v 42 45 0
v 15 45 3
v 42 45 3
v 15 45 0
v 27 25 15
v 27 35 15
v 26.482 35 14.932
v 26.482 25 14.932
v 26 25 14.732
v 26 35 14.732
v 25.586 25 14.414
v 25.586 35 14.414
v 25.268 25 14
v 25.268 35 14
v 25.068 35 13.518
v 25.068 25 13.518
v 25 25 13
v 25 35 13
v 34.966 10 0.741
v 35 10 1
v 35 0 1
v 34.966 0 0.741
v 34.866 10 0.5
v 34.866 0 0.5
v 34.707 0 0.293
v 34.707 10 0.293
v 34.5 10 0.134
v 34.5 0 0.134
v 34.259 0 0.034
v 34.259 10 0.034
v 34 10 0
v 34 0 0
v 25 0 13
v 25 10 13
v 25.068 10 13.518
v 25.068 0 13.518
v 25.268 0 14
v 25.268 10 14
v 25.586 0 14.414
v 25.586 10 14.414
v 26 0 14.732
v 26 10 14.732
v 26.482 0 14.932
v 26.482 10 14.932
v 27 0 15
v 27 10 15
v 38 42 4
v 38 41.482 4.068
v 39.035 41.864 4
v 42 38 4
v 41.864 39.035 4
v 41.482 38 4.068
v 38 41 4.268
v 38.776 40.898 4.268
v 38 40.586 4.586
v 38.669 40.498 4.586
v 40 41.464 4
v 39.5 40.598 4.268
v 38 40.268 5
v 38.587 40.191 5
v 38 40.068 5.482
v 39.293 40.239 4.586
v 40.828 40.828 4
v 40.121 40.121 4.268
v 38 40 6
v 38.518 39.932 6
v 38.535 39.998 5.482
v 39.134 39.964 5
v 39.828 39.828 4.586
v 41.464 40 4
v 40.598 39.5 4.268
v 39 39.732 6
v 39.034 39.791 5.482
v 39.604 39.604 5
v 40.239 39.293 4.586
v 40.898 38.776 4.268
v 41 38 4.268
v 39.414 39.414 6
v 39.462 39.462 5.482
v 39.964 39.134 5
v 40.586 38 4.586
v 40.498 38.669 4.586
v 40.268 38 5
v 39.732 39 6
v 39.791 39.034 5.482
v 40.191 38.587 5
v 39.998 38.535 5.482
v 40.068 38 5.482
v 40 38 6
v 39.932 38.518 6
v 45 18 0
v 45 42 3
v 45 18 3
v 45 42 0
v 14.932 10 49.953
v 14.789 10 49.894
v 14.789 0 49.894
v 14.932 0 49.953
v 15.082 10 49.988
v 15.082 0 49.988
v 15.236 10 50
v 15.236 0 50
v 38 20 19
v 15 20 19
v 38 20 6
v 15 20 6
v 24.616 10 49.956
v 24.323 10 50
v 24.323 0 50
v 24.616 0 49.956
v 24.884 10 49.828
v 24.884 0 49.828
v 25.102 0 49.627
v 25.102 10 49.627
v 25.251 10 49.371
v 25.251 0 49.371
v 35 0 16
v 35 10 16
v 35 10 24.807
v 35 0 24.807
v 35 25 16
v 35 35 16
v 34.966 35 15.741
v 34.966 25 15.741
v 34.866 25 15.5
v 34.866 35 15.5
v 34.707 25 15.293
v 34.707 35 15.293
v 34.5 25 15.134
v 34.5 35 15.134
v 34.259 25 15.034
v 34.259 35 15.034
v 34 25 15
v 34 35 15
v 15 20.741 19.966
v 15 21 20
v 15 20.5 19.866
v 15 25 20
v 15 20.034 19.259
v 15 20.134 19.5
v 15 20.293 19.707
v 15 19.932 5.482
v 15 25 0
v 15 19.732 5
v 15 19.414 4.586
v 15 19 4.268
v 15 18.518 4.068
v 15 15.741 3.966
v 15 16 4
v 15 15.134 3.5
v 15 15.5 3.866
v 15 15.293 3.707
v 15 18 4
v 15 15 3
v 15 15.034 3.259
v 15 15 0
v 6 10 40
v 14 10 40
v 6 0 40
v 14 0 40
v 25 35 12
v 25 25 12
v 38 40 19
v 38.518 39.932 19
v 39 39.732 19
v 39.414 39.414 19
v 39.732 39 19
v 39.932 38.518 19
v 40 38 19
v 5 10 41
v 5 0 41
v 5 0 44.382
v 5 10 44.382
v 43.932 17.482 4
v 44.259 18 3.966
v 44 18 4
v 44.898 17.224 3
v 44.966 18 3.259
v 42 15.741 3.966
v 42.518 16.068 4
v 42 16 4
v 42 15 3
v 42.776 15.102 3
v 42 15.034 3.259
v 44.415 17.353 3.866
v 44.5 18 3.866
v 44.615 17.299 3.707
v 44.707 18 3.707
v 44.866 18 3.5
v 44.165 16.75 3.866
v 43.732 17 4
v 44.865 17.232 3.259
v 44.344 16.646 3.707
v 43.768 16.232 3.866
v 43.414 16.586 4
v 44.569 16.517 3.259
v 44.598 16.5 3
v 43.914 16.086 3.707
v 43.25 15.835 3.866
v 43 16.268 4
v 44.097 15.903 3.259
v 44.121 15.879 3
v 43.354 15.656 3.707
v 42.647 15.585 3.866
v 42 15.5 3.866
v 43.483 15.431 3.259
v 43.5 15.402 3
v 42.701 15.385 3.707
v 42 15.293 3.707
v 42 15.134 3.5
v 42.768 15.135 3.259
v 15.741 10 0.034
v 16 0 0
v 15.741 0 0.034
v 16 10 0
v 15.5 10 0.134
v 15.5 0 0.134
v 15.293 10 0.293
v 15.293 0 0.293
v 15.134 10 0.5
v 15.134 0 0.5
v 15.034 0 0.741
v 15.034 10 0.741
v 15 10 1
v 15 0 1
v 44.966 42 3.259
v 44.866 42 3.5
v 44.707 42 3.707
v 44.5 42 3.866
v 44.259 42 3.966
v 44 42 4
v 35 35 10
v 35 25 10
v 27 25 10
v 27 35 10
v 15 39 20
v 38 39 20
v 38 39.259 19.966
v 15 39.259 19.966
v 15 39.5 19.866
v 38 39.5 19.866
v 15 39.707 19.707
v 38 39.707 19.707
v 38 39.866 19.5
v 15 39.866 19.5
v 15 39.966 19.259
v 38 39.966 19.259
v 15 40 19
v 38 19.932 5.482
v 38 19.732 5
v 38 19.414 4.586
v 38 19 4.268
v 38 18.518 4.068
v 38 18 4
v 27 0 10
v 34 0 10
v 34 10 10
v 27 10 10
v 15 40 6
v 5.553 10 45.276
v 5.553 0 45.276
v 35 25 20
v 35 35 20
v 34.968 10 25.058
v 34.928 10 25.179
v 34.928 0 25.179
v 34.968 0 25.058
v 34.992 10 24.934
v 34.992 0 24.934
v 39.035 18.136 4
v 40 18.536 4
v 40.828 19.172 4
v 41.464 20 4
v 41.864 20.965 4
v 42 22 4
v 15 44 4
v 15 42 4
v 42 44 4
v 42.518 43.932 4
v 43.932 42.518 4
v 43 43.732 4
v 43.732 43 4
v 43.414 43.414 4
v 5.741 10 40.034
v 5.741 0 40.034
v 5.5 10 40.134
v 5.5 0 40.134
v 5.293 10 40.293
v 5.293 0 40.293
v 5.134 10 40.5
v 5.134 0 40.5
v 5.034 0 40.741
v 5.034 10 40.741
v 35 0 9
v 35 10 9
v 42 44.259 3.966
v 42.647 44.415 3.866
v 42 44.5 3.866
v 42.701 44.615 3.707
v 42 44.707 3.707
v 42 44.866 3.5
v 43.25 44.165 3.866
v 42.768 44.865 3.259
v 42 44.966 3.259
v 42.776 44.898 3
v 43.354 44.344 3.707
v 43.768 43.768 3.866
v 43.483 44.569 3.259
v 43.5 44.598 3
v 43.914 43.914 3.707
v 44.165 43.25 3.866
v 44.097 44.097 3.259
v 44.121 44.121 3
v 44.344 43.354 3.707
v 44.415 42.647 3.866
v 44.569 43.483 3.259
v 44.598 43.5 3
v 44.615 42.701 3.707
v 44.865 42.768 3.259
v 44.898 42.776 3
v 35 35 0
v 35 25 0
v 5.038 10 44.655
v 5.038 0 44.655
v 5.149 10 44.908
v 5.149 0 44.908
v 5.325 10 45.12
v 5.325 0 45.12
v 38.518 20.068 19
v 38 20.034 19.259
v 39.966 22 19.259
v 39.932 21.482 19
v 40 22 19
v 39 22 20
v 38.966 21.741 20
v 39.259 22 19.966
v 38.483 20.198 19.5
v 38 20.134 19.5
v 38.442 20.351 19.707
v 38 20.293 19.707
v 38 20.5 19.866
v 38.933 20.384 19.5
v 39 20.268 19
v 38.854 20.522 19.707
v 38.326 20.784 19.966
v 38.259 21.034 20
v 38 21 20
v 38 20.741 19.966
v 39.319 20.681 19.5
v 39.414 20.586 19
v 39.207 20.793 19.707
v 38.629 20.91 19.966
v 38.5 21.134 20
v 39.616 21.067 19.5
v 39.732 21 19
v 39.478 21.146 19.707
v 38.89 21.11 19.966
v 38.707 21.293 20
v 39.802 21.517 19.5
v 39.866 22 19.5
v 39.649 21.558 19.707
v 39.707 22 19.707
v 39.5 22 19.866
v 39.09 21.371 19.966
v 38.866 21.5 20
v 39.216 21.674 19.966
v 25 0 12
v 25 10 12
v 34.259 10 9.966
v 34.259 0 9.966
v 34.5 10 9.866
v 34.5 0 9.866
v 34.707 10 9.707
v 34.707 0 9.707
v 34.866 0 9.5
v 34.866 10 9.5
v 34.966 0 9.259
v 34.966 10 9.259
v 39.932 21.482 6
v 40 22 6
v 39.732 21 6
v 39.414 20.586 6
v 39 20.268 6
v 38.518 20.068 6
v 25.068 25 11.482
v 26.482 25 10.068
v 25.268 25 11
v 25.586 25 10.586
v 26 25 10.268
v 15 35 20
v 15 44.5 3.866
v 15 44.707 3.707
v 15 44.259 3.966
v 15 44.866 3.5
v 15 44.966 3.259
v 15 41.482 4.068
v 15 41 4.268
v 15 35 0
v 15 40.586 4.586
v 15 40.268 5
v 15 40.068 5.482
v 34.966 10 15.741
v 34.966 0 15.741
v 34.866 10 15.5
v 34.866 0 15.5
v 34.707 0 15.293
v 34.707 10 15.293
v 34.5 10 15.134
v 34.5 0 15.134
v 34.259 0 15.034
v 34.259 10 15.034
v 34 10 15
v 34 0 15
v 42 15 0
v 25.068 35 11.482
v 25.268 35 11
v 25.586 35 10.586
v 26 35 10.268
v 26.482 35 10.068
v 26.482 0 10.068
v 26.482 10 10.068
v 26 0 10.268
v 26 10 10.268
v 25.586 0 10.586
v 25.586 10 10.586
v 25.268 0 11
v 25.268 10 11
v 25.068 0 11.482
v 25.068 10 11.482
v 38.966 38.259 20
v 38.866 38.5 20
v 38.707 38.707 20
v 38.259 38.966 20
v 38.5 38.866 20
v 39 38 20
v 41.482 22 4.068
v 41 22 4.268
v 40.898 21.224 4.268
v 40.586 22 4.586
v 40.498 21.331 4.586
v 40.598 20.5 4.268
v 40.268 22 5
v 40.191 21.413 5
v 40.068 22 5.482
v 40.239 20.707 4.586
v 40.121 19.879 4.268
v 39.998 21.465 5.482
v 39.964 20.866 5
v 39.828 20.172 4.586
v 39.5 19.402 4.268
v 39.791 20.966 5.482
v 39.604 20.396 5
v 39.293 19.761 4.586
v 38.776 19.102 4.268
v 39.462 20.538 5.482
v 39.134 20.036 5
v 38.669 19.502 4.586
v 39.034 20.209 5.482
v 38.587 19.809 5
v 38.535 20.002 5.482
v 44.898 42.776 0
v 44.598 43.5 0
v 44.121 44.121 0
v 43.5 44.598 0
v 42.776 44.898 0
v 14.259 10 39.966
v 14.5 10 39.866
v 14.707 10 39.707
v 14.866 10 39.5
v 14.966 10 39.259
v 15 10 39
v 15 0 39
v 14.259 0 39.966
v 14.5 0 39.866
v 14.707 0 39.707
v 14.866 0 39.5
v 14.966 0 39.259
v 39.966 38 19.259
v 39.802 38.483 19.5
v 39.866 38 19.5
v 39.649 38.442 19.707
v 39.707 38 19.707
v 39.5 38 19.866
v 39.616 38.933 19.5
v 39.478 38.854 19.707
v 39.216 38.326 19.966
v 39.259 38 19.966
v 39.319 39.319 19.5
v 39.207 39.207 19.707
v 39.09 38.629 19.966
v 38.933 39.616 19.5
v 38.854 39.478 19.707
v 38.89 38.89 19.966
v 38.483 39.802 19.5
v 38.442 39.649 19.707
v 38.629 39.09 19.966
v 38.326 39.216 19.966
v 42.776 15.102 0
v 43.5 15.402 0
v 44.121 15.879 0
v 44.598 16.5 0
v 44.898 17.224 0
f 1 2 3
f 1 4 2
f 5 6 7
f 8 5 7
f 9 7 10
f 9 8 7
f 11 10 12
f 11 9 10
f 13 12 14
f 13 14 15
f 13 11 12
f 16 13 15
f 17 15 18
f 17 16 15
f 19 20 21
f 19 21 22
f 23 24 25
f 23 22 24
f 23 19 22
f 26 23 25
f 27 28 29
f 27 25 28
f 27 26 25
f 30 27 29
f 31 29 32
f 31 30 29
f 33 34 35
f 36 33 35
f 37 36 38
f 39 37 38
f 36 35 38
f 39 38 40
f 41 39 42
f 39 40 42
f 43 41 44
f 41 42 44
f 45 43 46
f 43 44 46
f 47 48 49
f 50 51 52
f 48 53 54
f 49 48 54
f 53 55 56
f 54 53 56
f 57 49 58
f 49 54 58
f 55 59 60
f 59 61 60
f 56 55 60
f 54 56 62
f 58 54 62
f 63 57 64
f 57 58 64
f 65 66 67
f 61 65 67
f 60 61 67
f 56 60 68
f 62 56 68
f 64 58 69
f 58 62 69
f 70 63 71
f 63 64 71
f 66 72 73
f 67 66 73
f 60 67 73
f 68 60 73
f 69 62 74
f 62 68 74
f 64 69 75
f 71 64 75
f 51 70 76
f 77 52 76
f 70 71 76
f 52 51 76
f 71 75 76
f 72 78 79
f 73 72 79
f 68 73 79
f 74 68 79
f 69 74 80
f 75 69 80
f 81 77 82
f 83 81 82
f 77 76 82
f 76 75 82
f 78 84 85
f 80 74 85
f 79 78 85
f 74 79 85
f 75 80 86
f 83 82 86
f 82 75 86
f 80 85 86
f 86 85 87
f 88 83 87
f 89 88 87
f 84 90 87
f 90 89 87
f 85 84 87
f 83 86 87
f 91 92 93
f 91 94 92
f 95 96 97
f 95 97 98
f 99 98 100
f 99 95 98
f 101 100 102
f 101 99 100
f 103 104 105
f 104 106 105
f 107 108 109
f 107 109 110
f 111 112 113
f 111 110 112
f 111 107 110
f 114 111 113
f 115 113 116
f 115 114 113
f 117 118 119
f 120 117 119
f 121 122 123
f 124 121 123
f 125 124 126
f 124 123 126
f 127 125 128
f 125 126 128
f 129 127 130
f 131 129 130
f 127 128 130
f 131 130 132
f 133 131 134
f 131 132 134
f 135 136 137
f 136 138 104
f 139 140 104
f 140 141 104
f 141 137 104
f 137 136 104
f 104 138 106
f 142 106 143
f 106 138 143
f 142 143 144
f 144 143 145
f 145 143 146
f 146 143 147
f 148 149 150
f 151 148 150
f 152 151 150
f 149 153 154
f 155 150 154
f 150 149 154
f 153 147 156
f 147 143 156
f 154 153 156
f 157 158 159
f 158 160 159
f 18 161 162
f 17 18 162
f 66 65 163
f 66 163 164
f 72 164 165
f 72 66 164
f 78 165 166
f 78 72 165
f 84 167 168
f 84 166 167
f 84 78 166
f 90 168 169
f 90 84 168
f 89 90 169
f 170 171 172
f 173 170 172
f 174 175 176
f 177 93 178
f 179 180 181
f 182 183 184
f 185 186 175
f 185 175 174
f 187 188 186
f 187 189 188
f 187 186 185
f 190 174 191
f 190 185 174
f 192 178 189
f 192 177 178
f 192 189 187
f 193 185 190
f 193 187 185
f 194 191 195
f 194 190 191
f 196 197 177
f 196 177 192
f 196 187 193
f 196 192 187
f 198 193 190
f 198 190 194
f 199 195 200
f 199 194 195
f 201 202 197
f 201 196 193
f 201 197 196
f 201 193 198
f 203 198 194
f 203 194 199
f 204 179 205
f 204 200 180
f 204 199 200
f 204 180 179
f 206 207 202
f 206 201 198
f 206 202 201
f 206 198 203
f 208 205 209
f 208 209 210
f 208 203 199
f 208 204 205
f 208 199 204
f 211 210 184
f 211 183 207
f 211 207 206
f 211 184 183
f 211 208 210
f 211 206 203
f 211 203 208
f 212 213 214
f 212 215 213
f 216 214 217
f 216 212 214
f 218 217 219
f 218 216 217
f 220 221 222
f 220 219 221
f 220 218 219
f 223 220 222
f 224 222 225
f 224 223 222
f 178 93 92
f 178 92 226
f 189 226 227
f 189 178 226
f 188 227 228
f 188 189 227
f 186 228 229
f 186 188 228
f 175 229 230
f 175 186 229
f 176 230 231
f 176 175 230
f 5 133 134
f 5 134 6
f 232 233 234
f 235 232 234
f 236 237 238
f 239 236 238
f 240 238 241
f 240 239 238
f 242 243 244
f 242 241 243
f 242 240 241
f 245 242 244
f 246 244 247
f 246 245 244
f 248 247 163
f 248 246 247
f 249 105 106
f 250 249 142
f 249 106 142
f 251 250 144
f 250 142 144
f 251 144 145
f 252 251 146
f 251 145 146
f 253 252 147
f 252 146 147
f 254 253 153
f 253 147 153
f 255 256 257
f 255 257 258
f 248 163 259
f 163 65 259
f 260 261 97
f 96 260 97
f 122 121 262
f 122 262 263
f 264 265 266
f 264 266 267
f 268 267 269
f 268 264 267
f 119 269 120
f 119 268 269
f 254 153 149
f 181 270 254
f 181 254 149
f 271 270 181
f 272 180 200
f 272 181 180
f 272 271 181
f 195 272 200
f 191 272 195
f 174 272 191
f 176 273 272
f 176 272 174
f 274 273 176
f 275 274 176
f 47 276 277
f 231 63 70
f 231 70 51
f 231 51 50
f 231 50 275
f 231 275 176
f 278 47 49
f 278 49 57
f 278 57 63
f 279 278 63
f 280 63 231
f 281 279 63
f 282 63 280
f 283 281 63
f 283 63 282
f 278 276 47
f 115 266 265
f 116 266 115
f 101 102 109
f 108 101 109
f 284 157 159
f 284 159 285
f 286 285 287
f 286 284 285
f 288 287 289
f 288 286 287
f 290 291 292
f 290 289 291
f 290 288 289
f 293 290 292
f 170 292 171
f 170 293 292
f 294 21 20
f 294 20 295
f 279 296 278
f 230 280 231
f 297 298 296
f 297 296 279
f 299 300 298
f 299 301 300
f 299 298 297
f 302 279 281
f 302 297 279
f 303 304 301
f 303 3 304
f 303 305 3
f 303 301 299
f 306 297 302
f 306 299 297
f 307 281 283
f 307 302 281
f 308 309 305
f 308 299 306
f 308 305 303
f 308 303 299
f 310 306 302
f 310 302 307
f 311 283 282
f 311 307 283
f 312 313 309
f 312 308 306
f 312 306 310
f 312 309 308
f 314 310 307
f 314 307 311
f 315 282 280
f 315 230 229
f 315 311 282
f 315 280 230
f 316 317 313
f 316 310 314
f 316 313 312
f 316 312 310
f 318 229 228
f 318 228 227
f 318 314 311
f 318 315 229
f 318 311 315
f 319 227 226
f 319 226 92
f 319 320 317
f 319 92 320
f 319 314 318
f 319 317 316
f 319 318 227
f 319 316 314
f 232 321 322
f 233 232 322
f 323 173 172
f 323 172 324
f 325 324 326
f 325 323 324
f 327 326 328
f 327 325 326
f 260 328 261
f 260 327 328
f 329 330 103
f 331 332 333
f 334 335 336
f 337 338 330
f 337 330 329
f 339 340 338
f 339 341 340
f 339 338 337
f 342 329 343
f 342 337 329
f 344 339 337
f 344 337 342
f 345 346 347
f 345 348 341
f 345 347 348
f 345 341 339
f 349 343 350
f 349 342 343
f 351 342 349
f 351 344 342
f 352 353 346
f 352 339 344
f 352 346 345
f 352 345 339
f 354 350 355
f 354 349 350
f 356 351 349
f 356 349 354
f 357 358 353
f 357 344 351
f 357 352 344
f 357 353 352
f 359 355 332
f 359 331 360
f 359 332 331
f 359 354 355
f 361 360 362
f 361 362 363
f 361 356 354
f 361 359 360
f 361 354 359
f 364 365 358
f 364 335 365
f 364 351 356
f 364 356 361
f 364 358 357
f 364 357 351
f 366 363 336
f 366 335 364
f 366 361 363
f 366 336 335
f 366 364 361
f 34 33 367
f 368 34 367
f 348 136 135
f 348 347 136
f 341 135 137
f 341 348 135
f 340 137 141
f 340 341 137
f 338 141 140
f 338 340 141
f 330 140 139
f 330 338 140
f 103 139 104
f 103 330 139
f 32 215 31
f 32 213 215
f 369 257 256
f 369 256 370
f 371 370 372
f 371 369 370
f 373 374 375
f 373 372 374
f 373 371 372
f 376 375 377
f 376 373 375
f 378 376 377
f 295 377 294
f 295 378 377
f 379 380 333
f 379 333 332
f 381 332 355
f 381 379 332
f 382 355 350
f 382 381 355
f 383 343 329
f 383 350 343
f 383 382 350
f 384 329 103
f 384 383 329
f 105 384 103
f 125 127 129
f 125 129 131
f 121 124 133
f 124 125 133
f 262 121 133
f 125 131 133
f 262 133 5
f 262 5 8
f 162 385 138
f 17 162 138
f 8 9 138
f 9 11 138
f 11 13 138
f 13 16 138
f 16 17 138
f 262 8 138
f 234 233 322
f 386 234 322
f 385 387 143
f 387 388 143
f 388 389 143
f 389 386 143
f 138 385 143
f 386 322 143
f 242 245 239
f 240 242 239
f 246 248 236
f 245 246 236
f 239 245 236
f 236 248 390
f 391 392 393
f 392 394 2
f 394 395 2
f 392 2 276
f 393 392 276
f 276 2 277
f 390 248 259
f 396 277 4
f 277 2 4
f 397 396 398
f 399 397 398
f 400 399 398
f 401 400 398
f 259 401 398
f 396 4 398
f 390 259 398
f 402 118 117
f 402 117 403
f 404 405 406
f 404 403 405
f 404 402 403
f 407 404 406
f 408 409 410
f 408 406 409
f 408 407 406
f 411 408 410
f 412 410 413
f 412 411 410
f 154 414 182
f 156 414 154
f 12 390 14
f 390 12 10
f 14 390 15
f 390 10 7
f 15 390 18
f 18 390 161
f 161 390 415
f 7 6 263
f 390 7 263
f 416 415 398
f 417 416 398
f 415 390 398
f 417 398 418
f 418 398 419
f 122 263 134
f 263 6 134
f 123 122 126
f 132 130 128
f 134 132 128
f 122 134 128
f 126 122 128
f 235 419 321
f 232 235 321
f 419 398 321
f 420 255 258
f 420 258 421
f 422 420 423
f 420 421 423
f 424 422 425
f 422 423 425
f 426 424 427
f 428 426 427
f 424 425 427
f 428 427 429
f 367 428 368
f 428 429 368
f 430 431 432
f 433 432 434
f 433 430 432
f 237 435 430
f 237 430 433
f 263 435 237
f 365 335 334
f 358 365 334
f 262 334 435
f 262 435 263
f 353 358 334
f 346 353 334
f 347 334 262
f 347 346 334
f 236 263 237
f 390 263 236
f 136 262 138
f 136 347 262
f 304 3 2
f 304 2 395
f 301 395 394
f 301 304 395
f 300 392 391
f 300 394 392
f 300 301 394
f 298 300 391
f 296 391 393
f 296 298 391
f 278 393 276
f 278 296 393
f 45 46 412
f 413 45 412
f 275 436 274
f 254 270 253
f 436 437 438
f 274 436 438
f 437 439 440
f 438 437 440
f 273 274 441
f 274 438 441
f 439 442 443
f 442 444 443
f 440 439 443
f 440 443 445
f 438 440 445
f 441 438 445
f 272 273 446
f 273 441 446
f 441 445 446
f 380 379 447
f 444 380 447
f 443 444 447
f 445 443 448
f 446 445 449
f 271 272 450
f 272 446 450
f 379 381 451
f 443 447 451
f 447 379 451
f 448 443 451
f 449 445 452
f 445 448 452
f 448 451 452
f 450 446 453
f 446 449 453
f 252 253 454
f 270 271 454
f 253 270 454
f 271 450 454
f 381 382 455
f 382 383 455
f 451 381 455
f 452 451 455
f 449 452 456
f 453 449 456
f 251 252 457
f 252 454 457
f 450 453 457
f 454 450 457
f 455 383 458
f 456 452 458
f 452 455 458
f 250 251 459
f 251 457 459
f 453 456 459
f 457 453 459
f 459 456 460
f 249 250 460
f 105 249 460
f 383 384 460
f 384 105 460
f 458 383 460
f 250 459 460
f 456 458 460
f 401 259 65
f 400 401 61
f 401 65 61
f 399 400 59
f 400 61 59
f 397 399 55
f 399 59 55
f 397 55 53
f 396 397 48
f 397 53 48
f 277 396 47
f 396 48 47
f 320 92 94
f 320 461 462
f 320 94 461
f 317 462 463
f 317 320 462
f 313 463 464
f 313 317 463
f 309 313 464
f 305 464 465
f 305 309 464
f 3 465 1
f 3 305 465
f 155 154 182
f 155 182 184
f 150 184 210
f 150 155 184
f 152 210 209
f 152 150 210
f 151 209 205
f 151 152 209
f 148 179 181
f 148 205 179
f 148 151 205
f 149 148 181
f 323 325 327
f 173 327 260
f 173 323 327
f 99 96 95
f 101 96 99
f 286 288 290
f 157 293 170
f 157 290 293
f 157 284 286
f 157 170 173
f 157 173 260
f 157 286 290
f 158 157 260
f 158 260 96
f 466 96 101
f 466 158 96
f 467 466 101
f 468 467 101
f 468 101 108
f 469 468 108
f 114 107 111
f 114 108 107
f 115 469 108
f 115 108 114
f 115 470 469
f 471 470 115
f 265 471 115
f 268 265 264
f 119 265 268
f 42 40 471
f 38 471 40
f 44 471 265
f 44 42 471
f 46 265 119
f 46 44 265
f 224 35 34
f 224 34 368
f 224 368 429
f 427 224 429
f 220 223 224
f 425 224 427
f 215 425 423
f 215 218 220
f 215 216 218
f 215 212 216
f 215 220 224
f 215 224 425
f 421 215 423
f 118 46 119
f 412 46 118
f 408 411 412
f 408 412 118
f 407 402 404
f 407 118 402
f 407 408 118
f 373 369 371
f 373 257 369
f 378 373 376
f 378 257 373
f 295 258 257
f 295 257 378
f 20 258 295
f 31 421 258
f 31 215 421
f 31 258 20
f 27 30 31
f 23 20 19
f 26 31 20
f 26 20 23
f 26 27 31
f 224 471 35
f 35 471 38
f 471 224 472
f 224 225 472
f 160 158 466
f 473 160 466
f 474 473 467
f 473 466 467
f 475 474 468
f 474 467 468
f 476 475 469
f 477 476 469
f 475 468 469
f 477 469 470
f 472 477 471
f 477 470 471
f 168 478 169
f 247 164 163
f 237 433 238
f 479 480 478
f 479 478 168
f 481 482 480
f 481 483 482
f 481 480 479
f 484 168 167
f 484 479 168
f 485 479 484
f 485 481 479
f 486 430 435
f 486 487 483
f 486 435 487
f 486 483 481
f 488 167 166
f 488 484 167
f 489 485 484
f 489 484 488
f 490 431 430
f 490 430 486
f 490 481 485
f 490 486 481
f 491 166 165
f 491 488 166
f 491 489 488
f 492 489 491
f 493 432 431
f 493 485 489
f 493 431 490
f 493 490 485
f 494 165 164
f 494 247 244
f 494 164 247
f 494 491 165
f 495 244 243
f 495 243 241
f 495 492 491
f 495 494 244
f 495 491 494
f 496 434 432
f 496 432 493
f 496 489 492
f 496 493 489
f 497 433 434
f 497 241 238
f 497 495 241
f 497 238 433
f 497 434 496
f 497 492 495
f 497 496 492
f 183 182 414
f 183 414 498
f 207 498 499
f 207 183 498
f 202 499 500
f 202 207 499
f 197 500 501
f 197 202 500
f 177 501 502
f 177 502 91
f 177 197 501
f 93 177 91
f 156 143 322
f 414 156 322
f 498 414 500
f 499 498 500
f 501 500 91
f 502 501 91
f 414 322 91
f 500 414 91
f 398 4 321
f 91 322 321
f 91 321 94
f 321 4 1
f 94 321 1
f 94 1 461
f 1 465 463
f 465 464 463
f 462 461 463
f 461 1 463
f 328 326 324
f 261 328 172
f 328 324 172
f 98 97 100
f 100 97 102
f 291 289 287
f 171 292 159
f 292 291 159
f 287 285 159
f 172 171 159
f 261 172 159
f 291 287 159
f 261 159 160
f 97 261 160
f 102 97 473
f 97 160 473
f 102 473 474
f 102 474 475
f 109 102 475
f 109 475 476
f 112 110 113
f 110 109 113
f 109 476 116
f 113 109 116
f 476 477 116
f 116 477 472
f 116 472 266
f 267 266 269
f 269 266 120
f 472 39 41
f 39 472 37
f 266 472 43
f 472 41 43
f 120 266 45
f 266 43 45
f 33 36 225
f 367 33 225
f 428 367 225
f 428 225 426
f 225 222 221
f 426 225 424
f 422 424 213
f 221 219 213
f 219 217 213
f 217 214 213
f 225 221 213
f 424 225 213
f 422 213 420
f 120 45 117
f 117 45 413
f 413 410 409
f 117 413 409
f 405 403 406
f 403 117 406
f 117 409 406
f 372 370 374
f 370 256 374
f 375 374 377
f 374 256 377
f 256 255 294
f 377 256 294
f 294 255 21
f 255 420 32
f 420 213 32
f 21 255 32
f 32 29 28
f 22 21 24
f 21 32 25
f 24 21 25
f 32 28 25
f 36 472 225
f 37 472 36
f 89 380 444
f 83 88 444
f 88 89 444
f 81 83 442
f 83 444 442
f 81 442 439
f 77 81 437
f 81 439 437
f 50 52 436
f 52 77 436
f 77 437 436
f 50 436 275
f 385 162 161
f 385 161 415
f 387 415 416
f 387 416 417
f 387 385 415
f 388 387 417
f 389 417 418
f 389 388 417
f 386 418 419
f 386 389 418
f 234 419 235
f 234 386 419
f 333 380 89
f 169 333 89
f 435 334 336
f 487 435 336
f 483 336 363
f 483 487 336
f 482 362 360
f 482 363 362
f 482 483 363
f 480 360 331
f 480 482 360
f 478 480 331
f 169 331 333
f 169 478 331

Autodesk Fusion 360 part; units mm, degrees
sketch "Sketch1" plane through (0, 0, 0) normal (0, 1, 0) x (1, 0, 0)
  line L0 (25, 0) -> (15, 0)
  line L1 (15, 0) -> (15, -40)
  line L2 (25, -15) -> (25, -10)
  line L3 (15, -40) -> (5, -40)
  line L4 (5, -40) -> (5, -45)
  line L5 (15, -50) -> (25, -50)
  line L6 (5, -45) -> (15, -50)
  line L7 (25, 0) -> (35, 0)
  line L8 (35, 0) -> (35, -10)
  line L9 (35, -10) -> (25, -10)
  line L10 (25, -15) -> (35, -15)
  line L11 (35, -15) -> (35, -25)
  line L12 (35, -25) -> (25, -50)
extrude "Extrude1" add sketch "Sketch1" along normal blind 10 makes body 1
fillet "Fillet1" radius 1 10 edges at (15, 5, 50) (25, 5, 50) (35, 5, 25) (5, 5, 45) (5, 5, 40) (15, 5, 40) (15, 5, 0) (35, 5, 0) (35, 5, 10) (35, 5, 15) on bodies 1
fillet "Fillet2" radius 2 2 edges at (25, 5, 15) (25, 5, 10) on bodies 1
sketch "Sketch7" plane through (0, 0, 0) normal (0, 0, 1) x (1, 0, 0)
  line L0 (45, 15) -> (15, 15)
  line L1 (15, 45) -> (45, 45)
  line L2 (45, 45) -> (45, 15)
  line L3 (15, 35) -> (35, 35)
  line L4 (35, 35) -> (35, 25)
  line L5 (35, 25) -> (15, 25)
  line L6 (15, 15) -> (15, 25)
  line L7 (15, 35) -> (15, 45)
extrude "Extrude7" add sketch "Sketch7" along normal blind 4 separate body makes body 2
sketch "Sketch8" plane through (0, 0, 4) normal (0, 0, 1) x (-1, 0, 0)
  line L0 (-35, -35) -> (-35, -25)
  line L1 (-35, -25) -> (-15, -25)
  line L2 (-15, -25) -> (-15, -15)
  line L3 (-15, -15) -> (-45, -15)
  line L4 (-45, -15) -> (-45, -45)
  line L5 (-45, -45) -> (-15, -45)
  line L6 (-15, -45) -> (-15, -35)
  line L7 (-15, -35) -> (-35, -35)
  line L8 (-15, -40) -> (-40, -40)
  line L9 (-40, -40) -> (-40, -20)
  line L10 (-40, -20) -> (-15, -20)
  line L11 (-15, -25) -> (-35, -25)
  line L12 (-35, -35) -> (-15, -35)
extrude "Extrude8" add sketch "Sketch8" along normal blind 6 contours L0 L1 L2 L6 L7 L8 L9 L10 L11 L12 bodies 2
sketch "Sketch10" plane through (0, 0, 10) normal (0, 0, 1) x (-1, 0, 0)
  line L0 (-15, -25) -> (-15, -20)
  line L1 (-15, -20) -> (-40, -20)
  line L2 (-40, -20) -> (-40, -40)
  line L3 (-40, -40) -> (-15, -40)
  line L4 (-15, -40) -> (-15, -35)
  line L5 (-15, -35) -> (-35, -35)
  line L6 (-35, -35) -> (-35, -25)
  line L7 (-35, -25) -> (-15, -25)
  line L8 (-15, -40) -> (-40, -40)
  line L9 (-40, -20) -> (-15, -20)
  line L10 (-15, -25) -> (-25, -25)
  line L11 (-25, -35) -> (-15, -35)
  line L12 (-25, -35) -> (-25, -25)
extrude "Extrude9" add sketch "Sketch10" along normal blind 5 bodies 2
sketch "Sketch11" plane through (0, 0, 15) normal (0, 0, 1) x (-1, 0, 0)
  line L0 (-15, -40) -> (-15, -35)
  line L1 (-15, -35) -> (-25, -35)
  line L2 (-25, -35) -> (-25, -25)
  line L3 (-25, -25) -> (-15, -25)
  line L4 (-15, -25) -> (-15, -20)
  line L5 (-15, -20) -> (-40, -20)
  line L6 (-40, -20) -> (-40, -40)
  line L7 (-40, -40) -> (-15, -40)
  line L8 (-15, -40) -> (-40, -40)
  line L9 (-40, -20) -> (-15, -20)
  line L10 (-15, -25) -> (-35, -25)
  line L11 (-35, -25) -> (-35, -35)
  line L12 (-35, -35) -> (-15, -35)
extrude "Extrude10" add sketch "Sketch11" along normal blind 5 contours L0 L1 L3 L4 L5 L6 L7 L8 L9 L10 L11 L12 bodies 2
fillet "Fillet11" radius 3 2 edges at (45, 15, 2) (45, 45, 2) on bodies 2
fillet "Fillet12" radius 2 2 edges at (40, 20, 12) (40, 40, 12) on bodies 2
fillet "Fillet13" radius 1 10 edges at (28.5, 15, 4) (44.1213, 15.8787, 4) (45, 30, 4) (44.1213, 44.1213, 4) (28.5, 45, 4) (26.5, 20, 20) (39.4142, 20.5858, 20) (40, 30, 20) (39.4142, 39.4142, 20) (26.5, 40, 20) on bodies 2
fillet "Fillet14" radius 2 5 edges at (26.5, 40, 4) (39.4142, 39.4142, 4) (40, 30, 4) (39.4142, 20.5858, 4) (26.5, 20, 4) on bodies 2
fillet "Fillet15" radius 1 1 edges at (35, 30, 15) on bodies 2
fillet "Fillet16" radius 2 2 edges at (25, 30, 15) (25, 30, 10) on bodies 2
